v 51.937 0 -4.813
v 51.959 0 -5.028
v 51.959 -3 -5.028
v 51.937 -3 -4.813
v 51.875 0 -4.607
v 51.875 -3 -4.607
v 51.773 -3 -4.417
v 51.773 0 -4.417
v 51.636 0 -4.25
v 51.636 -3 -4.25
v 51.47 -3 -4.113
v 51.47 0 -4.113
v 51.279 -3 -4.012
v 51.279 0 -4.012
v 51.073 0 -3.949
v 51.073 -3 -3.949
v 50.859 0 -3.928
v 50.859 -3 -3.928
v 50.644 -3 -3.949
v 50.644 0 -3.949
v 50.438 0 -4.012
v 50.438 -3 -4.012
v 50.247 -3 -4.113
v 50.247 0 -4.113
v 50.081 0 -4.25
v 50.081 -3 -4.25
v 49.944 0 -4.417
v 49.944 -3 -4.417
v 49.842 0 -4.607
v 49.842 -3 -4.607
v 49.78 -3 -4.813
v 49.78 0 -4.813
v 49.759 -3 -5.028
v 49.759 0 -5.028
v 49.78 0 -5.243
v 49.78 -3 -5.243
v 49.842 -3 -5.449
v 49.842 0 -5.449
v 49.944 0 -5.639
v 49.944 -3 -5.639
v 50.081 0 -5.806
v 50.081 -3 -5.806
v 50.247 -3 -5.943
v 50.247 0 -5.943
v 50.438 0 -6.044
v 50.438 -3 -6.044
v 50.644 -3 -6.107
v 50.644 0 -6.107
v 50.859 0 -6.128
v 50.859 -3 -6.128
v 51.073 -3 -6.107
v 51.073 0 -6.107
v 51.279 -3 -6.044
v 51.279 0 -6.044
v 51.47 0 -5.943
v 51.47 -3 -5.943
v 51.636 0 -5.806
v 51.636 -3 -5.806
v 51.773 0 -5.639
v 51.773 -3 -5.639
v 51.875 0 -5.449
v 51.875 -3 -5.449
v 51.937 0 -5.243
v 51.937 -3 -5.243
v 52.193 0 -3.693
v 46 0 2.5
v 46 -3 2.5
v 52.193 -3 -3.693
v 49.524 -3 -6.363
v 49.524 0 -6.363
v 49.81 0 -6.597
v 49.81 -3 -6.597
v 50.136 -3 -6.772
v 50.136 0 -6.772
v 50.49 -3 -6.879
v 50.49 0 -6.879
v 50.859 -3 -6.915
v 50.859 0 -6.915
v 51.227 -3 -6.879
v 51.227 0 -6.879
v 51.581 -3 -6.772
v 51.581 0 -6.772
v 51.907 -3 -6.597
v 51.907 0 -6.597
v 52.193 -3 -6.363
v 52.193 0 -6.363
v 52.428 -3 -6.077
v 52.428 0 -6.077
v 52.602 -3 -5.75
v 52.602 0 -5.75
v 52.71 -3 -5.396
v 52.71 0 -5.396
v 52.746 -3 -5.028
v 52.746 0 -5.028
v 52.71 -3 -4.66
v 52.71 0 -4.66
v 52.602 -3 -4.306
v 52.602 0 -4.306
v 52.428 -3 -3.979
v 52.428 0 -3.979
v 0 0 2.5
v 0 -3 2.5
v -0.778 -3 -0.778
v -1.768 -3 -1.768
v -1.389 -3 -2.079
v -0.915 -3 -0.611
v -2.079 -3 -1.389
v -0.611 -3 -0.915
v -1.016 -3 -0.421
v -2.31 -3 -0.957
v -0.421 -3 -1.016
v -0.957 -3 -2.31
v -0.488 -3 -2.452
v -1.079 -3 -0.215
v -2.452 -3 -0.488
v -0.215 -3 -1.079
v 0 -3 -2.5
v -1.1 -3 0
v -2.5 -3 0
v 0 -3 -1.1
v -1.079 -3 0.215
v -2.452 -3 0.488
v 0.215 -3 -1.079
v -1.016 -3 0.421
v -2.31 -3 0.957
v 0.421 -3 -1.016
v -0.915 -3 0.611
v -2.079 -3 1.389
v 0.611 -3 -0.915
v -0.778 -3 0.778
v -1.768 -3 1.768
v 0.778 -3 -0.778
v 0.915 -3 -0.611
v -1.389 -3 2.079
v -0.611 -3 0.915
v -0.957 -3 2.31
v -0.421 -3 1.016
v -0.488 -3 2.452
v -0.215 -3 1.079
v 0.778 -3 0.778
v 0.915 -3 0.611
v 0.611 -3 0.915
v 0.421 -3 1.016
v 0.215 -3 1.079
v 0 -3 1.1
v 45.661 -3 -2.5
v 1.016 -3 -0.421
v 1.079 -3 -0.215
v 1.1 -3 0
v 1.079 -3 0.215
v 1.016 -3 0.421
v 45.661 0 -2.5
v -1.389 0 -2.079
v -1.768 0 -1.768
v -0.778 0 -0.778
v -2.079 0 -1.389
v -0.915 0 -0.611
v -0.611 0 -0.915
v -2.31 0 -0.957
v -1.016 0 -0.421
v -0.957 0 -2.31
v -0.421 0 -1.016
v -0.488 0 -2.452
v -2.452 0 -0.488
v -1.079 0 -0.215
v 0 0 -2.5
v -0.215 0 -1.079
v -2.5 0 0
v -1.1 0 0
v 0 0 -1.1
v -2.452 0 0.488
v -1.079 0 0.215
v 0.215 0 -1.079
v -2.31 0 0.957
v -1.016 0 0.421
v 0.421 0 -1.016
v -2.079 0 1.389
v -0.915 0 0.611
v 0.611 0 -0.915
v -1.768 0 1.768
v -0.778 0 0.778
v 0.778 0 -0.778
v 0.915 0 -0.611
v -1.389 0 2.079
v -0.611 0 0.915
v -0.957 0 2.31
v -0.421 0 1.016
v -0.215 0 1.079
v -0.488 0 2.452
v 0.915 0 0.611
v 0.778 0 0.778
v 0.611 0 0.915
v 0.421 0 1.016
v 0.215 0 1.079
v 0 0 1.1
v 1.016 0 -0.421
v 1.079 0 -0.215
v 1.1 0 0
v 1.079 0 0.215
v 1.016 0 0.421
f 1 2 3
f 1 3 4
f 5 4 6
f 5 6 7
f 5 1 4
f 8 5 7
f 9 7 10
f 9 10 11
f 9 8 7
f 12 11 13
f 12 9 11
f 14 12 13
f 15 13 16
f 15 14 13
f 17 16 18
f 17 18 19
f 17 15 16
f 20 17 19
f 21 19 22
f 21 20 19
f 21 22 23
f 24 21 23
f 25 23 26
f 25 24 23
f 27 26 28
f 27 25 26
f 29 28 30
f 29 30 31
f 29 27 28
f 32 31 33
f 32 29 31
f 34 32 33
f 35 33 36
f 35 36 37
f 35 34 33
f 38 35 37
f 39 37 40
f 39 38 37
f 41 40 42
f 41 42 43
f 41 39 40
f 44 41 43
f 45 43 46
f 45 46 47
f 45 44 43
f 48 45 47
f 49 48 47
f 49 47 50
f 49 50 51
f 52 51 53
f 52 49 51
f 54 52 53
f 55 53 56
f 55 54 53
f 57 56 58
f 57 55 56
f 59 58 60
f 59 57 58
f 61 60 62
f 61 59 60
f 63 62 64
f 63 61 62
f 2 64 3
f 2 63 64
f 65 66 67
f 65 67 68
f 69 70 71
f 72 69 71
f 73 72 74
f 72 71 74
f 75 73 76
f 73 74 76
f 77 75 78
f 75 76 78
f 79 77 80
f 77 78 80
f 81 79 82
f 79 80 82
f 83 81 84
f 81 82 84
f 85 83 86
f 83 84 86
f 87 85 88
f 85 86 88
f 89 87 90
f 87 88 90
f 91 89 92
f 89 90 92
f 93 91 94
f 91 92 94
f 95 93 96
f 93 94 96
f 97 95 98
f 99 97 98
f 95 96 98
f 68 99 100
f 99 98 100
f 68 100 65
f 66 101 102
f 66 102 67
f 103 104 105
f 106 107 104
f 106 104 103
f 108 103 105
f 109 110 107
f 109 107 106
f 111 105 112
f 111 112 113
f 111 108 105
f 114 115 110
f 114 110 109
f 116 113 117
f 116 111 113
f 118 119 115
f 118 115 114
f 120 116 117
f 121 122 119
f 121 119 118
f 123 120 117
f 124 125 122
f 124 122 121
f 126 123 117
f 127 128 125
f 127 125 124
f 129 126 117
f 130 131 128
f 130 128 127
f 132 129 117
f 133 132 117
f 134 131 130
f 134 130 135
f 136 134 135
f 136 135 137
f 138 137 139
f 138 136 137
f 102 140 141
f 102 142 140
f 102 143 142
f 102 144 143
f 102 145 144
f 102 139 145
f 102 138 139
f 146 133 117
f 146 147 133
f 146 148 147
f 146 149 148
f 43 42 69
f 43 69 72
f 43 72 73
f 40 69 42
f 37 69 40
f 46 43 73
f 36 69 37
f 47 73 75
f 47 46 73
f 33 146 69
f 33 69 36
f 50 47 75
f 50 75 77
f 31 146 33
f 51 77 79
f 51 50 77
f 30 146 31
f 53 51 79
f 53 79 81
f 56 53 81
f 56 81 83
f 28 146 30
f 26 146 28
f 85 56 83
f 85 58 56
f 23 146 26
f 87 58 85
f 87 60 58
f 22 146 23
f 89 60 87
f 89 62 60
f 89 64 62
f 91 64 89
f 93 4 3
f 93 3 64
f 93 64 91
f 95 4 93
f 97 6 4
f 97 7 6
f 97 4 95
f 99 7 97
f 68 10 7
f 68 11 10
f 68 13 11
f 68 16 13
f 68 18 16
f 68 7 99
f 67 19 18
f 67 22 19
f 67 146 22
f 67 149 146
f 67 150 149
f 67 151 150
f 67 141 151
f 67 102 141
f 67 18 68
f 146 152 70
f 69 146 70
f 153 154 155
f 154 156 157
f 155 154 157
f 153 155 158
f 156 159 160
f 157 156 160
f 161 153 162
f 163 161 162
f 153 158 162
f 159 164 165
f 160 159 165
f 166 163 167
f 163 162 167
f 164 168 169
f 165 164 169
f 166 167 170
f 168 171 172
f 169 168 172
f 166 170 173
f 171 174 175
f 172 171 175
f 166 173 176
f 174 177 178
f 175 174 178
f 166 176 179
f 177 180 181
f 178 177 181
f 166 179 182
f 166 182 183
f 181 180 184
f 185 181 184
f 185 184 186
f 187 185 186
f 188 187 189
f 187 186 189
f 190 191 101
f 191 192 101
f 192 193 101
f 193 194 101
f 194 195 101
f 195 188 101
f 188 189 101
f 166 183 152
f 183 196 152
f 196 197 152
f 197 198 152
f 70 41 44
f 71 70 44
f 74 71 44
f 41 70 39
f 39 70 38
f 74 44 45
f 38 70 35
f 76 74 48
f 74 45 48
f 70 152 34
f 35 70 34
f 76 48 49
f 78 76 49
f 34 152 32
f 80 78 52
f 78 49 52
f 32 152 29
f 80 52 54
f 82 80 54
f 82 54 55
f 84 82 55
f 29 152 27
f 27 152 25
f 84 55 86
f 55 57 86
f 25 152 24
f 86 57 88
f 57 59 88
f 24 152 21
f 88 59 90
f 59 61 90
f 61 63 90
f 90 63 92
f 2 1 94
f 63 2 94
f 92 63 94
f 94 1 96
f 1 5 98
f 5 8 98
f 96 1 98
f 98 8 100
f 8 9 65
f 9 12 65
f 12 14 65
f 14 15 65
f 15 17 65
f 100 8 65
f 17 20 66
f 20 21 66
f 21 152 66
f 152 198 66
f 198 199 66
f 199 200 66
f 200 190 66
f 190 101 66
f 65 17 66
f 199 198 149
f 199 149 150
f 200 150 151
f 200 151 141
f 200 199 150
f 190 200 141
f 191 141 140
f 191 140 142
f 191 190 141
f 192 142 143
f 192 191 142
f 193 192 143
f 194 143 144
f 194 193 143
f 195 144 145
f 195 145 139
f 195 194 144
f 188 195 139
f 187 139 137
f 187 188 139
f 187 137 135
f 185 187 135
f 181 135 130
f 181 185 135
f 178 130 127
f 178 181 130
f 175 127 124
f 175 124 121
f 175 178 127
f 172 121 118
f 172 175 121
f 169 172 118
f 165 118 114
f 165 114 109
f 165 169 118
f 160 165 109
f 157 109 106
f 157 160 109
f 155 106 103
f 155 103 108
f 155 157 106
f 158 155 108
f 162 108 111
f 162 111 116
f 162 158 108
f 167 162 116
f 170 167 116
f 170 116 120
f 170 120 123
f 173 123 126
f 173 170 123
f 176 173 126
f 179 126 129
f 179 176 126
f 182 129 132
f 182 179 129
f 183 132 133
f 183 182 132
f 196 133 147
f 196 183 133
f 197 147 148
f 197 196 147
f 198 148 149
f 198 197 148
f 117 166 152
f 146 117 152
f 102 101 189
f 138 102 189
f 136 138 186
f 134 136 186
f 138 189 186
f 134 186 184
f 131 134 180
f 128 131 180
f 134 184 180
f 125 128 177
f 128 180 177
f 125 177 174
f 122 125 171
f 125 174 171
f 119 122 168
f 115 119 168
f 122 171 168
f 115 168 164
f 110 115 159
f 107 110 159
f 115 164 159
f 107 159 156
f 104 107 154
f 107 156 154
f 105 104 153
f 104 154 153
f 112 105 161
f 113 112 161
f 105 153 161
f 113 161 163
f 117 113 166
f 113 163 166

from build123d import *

# Parameters (mm, degrees)
SKETCH_R  = 1.1
PAD_DEPTH = 3


with BuildPart() as part:
    # Sketch → Pad (new body)
    with BuildSketch(Plane.XZ):
        with BuildLine():
            ThreePointArc((0, 2.5), (-2.5, 0), (0, -2.5))
            Line((0, -2.5), (45.661184, -2.5))
            Line((45.661184, -2.5), (49.52382, -6.362636))
            ThreePointArc((49.52382, -6.362636), (52.193228, -6.362636), (52.193228, -3.693228))
            Line((46, 2.5), (52.193228, -3.693228))
            Line((0, 2.5), (46, 2.5))
        make_face()
        Circle(SKETCH_R, mode=Mode.SUBTRACT)
        with Locations((50.858524, -5.027932)):
            Circle(SKETCH_R, mode=Mode.SUBTRACT)
    extrude(amount=PAD_DEPTH)


solid = part.part
